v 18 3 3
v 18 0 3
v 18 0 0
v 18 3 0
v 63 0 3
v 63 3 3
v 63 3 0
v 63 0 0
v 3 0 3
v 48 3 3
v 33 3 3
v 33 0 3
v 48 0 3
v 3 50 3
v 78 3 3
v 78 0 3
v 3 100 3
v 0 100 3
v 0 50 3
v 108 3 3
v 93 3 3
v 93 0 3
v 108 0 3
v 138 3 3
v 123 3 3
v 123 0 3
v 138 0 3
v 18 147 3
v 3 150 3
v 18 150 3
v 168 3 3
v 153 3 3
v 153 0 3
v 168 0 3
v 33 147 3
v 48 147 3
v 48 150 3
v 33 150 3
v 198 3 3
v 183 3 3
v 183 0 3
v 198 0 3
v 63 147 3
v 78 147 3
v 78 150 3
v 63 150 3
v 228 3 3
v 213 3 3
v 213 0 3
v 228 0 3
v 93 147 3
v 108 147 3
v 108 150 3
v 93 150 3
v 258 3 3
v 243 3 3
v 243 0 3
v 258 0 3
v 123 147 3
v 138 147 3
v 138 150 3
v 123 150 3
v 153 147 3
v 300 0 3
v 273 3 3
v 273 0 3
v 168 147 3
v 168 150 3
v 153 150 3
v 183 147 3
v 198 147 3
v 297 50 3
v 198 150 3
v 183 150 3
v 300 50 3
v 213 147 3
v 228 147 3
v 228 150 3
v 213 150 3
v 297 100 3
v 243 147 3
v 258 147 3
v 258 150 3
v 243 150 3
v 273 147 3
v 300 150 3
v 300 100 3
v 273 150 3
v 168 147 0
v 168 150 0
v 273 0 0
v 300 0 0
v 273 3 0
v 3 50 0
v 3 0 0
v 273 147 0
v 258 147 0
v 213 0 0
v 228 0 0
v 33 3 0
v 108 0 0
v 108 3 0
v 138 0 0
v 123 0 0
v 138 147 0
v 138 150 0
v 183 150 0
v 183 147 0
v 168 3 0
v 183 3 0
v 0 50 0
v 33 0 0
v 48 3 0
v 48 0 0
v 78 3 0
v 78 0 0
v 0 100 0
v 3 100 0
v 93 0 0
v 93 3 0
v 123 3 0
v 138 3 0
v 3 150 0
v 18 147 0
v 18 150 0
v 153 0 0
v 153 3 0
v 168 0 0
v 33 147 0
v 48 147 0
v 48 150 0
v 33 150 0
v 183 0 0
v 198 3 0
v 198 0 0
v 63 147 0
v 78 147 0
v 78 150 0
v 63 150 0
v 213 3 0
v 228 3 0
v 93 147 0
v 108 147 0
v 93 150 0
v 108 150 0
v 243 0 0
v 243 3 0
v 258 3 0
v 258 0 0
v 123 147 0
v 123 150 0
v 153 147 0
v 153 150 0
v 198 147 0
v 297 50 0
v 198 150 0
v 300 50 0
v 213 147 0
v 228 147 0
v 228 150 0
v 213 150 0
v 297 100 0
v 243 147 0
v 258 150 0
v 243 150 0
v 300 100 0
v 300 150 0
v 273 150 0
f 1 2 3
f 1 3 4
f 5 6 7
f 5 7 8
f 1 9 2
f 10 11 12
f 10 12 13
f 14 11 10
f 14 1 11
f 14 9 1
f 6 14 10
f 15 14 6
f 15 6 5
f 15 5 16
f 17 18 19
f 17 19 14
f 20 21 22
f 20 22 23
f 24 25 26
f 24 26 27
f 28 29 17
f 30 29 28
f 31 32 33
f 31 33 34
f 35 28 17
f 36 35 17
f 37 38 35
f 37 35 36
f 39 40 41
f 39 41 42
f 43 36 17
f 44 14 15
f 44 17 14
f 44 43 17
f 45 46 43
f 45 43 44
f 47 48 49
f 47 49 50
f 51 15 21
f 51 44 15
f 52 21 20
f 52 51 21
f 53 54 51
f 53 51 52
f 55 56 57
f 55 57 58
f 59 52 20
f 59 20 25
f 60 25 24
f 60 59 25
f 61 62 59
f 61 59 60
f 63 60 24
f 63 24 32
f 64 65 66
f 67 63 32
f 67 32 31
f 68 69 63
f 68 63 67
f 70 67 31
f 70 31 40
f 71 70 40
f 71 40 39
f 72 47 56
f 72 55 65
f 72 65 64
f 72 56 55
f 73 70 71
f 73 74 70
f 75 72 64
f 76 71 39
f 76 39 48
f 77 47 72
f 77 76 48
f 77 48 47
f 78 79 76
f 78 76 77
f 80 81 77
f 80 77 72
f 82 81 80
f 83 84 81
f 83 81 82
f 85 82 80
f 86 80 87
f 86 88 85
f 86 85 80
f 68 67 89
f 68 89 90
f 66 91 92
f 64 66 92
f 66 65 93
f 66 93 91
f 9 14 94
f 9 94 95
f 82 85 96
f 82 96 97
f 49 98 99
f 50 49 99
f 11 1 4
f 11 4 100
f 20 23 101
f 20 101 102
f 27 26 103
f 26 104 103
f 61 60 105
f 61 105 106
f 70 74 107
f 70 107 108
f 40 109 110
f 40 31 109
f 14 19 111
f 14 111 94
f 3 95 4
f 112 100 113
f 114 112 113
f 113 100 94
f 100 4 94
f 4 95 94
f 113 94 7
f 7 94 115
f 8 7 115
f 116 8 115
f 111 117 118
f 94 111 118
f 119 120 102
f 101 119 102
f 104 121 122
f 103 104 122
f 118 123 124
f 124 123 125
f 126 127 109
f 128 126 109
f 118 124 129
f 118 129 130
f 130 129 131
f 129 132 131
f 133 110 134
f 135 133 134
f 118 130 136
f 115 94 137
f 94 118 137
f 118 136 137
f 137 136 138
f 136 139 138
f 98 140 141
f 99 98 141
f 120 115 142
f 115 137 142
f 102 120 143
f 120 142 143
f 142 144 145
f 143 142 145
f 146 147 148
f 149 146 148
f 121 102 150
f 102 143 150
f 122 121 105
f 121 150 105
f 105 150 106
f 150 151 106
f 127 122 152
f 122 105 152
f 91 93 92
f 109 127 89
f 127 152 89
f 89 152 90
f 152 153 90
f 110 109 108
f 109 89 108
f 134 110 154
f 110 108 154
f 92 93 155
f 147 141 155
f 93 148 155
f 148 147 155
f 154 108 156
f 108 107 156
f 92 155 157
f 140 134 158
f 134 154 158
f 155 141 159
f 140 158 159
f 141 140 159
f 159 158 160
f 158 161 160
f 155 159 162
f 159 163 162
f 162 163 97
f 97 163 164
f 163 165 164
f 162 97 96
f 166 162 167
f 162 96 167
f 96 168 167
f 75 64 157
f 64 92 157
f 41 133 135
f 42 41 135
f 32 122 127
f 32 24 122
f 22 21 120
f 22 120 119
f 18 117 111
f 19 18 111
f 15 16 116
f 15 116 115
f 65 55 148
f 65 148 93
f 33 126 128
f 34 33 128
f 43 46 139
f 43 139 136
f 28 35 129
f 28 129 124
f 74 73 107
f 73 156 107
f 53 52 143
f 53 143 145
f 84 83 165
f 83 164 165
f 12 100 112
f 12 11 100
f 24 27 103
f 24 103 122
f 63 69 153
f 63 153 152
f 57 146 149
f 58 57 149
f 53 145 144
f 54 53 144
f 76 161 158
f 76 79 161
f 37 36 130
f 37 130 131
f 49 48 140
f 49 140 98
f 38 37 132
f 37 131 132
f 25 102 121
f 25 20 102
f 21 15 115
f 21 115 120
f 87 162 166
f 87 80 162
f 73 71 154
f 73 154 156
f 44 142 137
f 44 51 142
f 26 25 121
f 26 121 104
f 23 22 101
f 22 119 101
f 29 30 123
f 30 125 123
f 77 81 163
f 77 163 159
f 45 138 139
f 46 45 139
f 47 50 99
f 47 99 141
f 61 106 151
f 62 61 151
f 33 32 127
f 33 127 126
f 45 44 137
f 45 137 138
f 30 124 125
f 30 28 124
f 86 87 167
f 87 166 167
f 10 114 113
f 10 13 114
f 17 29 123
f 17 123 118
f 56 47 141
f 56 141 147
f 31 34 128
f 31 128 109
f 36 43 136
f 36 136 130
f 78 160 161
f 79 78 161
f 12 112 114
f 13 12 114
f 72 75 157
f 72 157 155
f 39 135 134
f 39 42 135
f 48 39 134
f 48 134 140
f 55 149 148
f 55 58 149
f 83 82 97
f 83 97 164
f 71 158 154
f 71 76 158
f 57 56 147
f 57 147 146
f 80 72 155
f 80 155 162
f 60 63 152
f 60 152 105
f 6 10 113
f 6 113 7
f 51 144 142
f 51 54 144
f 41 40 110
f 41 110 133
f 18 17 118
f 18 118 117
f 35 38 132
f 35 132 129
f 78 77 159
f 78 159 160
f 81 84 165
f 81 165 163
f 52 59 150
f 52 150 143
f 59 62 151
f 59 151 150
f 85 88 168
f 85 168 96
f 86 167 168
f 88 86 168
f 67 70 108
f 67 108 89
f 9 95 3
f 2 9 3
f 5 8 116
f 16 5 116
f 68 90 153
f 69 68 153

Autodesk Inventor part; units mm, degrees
ref_plane "YZ Plane" through (0, 0, 0) normal (1, 0, 0) x (0, 1, 0)
ref_plane "XZ Plane" through (0, 0, 0) normal (0, 1, 0) x (-1, 0, 0)
ref_plane "XY Plane" through (0, 0, 0) normal (0, 0, 1) x (1, 0, 0)
sketch "Boceto1" plane through (0, 0, 0) normal (0, 0, 1) x (1, 0, 0)
  line L0 (0, 0) -> (300, 0)
  line L1 (300, 0) -> (300, 150)
  line L2 (300, 150) -> (0, 150)
  line L3 (0, 150) -> (0, 0)
  dimension "d0" = 150
  dimension "d1" = 300
extrude "Extrusión1" add sketch "Boceto1" along normal blind 3
sketch "Boceto3" plane through (0, 0, 3) normal (0, 0, 1) x (1, 0, 0)
  line L0 (0, 0) -> (300, 0) construction
  line L1 (300, 0) -> (300, 150) construction
  line L2 (300, 150) -> (0, 150) construction
  line L3 (0, 150) -> (0, 0) construction
  line L4 (0, 50) -> (3, 50)
  line L5 (3, 50) -> (3, 0)
  line L6 (3, 0) -> (0, 0)
  line L7 (0, 0) -> (0, 50)
  line L8 (0, 100) -> (0, 150)
  line L9 (0, 150) -> (3, 150)
  line L10 (3, 150) -> (3, 100)
  line L11 (3, 100) -> (0, 100)
  line L12 (297, 100) -> (300, 100)
  line L13 (300, 100) -> (300, 50)
  line L14 (300, 50) -> (297, 50)
  line L15 (297, 50) -> (297, 100)
  line L16 (300, 0) -> (300, 150) construction
  point P0 (300, 75)
  point P1 (300, 75)
  dimension "d15" = 3
  dimension "d16" = 50
  dimension "d19" = 100
  dimension "d24" = 3
  dimension "d25" = 50
extrude "Extrusión3" cut sketch "Boceto3" against normal blind 3
sketch "Boceto4" plane through (0, 0, 3) normal (0, 0, 1) x (1, 0, 0)
  line L0 (3, 150) -> (3, 100) construction
  line L1 (3, 100) -> (0, 100) construction
  line L2 (0, 100) -> (0, 50) construction
  line L3 (0, 50) -> (3, 50) construction
  line L4 (3, 50) -> (3, 0) construction
  line L5 (3, 0) -> (300, 0) construction
  line L6 (300, 0) -> (300, 50) construction
  line L7 (300, 50) -> (297, 50) construction
  line L8 (297, 50) -> (297, 100) construction
  line L9 (297, 100) -> (300, 100) construction
  line L10 (300, 100) -> (300, 150) construction
  line L11 (300, 150) -> (3, 150) construction
  line L12 (18, 3) -> (33, 3)
  line L13 (33, 3) -> (33, 0)
  line L14 (33, 0) -> (18, 0)
  line L15 (18, 0) -> (18, 3)
  line L16 (18, 150) -> (33, 150)
  line L17 (33, 150) -> (33, 147)
  line L18 (33, 147) -> (18, 147)
  line L19 (18, 147) -> (18, 150)
  line L20 (300, 150) -> (3, 150) construction
  line L21 (3, 0) -> (300, 0) construction
  line L22 (48, 0) -> (48, 3)
  line L23 (63, 0) -> (48, 0)
  line L24 (48, 3) -> (63, 3)
  line L25 (63, 3) -> (63, 0)
  line L26 (48, 147) -> (48, 150)
  line L27 (48, 150) -> (63, 150)
  line L28 (63, 147) -> (48, 147)
  line L29 (63, 150) -> (63, 147)
  line L30 (78, 0) -> (78, 3)
  line L31 (93, 0) -> (78, 0)
  line L32 (78, 3) -> (93, 3)
  line L33 (93, 3) -> (93, 0)
  line L34 (78, 147) -> (78, 150)
  line L35 (78, 150) -> (93, 150)
  line L36 (93, 147) -> (78, 147)
  line L37 (93, 150) -> (93, 147)
  line L38 (108, 0) -> (108, 3)
  line L39 (123, 0) -> (108, 0)
  line L40 (108, 3) -> (123, 3)
  line L41 (123, 3) -> (123, 0)
  line L42 (108, 147) -> (108, 150)
  line L43 (108, 150) -> (123, 150)
  line L44 (123, 147) -> (108, 147)
  line L45 (123, 150) -> (123, 147)
  line L46 (138, 0) -> (138, 3)
  line L47 (153, 0) -> (138, 0)
  line L48 (138, 3) -> (153, 3)
  line L49 (153, 3) -> (153, 0)
  line L50 (138, 147) -> (138, 150)
  line L51 (138, 150) -> (153, 150)
  line L52 (153, 147) -> (138, 147)
  line L53 (153, 150) -> (153, 147)
  line L54 (168, 0) -> (168, 3)
  line L55 (183, 0) -> (168, 0)
  line L56 (168, 3) -> (183, 3)
  line L57 (183, 3) -> (183, 0)
  line L58 (168, 147) -> (168, 150)
  line L59 (168, 150) -> (183, 150)
  line L60 (183, 147) -> (168, 147)
  line L61 (183, 150) -> (183, 147)
  line L62 (198, 0) -> (198, 3)
  line L63 (213, 0) -> (198, 0)
  line L64 (198, 3) -> (213, 3)
  line L65 (213, 3) -> (213, 0)
  line L66 (198, 147) -> (198, 150)
  line L67 (198, 150) -> (213, 150)
  line L68 (213, 147) -> (198, 147)
  line L69 (213, 150) -> (213, 147)
  line L70 (228, 0) -> (228, 3)
  line L71 (243, 0) -> (228, 0)
  line L72 (228, 3) -> (243, 3)
  line L73 (243, 3) -> (243, 0)
  line L74 (228, 147) -> (228, 150)
  line L75 (228, 150) -> (243, 150)
  line L76 (243, 147) -> (228, 147)
  line L77 (243, 150) -> (243, 147)
  line L78 (258, 0) -> (258, 3)
  line L79 (273, 0) -> (258, 0)
  line L80 (258, 3) -> (273, 3)
  line L81 (273, 3) -> (273, 0)
  line L82 (258, 147) -> (258, 150)
  line L83 (258, 150) -> (273, 150)
  line L84 (273, 147) -> (258, 147)
  line L85 (273, 150) -> (273, 147)
  point P0 (0, 0)
  dimension "d28" = 3
  dimension "d29" = 3
  dimension "d30" = 15
  dimension "d31" = 15
  dimension "d32" = 15
  dimension "d33" = 15
  dimension "d36" = 30
extrude "Extrusión4" cut sketch "Boceto4" against normal blind 10
properties part number "Pared2"
